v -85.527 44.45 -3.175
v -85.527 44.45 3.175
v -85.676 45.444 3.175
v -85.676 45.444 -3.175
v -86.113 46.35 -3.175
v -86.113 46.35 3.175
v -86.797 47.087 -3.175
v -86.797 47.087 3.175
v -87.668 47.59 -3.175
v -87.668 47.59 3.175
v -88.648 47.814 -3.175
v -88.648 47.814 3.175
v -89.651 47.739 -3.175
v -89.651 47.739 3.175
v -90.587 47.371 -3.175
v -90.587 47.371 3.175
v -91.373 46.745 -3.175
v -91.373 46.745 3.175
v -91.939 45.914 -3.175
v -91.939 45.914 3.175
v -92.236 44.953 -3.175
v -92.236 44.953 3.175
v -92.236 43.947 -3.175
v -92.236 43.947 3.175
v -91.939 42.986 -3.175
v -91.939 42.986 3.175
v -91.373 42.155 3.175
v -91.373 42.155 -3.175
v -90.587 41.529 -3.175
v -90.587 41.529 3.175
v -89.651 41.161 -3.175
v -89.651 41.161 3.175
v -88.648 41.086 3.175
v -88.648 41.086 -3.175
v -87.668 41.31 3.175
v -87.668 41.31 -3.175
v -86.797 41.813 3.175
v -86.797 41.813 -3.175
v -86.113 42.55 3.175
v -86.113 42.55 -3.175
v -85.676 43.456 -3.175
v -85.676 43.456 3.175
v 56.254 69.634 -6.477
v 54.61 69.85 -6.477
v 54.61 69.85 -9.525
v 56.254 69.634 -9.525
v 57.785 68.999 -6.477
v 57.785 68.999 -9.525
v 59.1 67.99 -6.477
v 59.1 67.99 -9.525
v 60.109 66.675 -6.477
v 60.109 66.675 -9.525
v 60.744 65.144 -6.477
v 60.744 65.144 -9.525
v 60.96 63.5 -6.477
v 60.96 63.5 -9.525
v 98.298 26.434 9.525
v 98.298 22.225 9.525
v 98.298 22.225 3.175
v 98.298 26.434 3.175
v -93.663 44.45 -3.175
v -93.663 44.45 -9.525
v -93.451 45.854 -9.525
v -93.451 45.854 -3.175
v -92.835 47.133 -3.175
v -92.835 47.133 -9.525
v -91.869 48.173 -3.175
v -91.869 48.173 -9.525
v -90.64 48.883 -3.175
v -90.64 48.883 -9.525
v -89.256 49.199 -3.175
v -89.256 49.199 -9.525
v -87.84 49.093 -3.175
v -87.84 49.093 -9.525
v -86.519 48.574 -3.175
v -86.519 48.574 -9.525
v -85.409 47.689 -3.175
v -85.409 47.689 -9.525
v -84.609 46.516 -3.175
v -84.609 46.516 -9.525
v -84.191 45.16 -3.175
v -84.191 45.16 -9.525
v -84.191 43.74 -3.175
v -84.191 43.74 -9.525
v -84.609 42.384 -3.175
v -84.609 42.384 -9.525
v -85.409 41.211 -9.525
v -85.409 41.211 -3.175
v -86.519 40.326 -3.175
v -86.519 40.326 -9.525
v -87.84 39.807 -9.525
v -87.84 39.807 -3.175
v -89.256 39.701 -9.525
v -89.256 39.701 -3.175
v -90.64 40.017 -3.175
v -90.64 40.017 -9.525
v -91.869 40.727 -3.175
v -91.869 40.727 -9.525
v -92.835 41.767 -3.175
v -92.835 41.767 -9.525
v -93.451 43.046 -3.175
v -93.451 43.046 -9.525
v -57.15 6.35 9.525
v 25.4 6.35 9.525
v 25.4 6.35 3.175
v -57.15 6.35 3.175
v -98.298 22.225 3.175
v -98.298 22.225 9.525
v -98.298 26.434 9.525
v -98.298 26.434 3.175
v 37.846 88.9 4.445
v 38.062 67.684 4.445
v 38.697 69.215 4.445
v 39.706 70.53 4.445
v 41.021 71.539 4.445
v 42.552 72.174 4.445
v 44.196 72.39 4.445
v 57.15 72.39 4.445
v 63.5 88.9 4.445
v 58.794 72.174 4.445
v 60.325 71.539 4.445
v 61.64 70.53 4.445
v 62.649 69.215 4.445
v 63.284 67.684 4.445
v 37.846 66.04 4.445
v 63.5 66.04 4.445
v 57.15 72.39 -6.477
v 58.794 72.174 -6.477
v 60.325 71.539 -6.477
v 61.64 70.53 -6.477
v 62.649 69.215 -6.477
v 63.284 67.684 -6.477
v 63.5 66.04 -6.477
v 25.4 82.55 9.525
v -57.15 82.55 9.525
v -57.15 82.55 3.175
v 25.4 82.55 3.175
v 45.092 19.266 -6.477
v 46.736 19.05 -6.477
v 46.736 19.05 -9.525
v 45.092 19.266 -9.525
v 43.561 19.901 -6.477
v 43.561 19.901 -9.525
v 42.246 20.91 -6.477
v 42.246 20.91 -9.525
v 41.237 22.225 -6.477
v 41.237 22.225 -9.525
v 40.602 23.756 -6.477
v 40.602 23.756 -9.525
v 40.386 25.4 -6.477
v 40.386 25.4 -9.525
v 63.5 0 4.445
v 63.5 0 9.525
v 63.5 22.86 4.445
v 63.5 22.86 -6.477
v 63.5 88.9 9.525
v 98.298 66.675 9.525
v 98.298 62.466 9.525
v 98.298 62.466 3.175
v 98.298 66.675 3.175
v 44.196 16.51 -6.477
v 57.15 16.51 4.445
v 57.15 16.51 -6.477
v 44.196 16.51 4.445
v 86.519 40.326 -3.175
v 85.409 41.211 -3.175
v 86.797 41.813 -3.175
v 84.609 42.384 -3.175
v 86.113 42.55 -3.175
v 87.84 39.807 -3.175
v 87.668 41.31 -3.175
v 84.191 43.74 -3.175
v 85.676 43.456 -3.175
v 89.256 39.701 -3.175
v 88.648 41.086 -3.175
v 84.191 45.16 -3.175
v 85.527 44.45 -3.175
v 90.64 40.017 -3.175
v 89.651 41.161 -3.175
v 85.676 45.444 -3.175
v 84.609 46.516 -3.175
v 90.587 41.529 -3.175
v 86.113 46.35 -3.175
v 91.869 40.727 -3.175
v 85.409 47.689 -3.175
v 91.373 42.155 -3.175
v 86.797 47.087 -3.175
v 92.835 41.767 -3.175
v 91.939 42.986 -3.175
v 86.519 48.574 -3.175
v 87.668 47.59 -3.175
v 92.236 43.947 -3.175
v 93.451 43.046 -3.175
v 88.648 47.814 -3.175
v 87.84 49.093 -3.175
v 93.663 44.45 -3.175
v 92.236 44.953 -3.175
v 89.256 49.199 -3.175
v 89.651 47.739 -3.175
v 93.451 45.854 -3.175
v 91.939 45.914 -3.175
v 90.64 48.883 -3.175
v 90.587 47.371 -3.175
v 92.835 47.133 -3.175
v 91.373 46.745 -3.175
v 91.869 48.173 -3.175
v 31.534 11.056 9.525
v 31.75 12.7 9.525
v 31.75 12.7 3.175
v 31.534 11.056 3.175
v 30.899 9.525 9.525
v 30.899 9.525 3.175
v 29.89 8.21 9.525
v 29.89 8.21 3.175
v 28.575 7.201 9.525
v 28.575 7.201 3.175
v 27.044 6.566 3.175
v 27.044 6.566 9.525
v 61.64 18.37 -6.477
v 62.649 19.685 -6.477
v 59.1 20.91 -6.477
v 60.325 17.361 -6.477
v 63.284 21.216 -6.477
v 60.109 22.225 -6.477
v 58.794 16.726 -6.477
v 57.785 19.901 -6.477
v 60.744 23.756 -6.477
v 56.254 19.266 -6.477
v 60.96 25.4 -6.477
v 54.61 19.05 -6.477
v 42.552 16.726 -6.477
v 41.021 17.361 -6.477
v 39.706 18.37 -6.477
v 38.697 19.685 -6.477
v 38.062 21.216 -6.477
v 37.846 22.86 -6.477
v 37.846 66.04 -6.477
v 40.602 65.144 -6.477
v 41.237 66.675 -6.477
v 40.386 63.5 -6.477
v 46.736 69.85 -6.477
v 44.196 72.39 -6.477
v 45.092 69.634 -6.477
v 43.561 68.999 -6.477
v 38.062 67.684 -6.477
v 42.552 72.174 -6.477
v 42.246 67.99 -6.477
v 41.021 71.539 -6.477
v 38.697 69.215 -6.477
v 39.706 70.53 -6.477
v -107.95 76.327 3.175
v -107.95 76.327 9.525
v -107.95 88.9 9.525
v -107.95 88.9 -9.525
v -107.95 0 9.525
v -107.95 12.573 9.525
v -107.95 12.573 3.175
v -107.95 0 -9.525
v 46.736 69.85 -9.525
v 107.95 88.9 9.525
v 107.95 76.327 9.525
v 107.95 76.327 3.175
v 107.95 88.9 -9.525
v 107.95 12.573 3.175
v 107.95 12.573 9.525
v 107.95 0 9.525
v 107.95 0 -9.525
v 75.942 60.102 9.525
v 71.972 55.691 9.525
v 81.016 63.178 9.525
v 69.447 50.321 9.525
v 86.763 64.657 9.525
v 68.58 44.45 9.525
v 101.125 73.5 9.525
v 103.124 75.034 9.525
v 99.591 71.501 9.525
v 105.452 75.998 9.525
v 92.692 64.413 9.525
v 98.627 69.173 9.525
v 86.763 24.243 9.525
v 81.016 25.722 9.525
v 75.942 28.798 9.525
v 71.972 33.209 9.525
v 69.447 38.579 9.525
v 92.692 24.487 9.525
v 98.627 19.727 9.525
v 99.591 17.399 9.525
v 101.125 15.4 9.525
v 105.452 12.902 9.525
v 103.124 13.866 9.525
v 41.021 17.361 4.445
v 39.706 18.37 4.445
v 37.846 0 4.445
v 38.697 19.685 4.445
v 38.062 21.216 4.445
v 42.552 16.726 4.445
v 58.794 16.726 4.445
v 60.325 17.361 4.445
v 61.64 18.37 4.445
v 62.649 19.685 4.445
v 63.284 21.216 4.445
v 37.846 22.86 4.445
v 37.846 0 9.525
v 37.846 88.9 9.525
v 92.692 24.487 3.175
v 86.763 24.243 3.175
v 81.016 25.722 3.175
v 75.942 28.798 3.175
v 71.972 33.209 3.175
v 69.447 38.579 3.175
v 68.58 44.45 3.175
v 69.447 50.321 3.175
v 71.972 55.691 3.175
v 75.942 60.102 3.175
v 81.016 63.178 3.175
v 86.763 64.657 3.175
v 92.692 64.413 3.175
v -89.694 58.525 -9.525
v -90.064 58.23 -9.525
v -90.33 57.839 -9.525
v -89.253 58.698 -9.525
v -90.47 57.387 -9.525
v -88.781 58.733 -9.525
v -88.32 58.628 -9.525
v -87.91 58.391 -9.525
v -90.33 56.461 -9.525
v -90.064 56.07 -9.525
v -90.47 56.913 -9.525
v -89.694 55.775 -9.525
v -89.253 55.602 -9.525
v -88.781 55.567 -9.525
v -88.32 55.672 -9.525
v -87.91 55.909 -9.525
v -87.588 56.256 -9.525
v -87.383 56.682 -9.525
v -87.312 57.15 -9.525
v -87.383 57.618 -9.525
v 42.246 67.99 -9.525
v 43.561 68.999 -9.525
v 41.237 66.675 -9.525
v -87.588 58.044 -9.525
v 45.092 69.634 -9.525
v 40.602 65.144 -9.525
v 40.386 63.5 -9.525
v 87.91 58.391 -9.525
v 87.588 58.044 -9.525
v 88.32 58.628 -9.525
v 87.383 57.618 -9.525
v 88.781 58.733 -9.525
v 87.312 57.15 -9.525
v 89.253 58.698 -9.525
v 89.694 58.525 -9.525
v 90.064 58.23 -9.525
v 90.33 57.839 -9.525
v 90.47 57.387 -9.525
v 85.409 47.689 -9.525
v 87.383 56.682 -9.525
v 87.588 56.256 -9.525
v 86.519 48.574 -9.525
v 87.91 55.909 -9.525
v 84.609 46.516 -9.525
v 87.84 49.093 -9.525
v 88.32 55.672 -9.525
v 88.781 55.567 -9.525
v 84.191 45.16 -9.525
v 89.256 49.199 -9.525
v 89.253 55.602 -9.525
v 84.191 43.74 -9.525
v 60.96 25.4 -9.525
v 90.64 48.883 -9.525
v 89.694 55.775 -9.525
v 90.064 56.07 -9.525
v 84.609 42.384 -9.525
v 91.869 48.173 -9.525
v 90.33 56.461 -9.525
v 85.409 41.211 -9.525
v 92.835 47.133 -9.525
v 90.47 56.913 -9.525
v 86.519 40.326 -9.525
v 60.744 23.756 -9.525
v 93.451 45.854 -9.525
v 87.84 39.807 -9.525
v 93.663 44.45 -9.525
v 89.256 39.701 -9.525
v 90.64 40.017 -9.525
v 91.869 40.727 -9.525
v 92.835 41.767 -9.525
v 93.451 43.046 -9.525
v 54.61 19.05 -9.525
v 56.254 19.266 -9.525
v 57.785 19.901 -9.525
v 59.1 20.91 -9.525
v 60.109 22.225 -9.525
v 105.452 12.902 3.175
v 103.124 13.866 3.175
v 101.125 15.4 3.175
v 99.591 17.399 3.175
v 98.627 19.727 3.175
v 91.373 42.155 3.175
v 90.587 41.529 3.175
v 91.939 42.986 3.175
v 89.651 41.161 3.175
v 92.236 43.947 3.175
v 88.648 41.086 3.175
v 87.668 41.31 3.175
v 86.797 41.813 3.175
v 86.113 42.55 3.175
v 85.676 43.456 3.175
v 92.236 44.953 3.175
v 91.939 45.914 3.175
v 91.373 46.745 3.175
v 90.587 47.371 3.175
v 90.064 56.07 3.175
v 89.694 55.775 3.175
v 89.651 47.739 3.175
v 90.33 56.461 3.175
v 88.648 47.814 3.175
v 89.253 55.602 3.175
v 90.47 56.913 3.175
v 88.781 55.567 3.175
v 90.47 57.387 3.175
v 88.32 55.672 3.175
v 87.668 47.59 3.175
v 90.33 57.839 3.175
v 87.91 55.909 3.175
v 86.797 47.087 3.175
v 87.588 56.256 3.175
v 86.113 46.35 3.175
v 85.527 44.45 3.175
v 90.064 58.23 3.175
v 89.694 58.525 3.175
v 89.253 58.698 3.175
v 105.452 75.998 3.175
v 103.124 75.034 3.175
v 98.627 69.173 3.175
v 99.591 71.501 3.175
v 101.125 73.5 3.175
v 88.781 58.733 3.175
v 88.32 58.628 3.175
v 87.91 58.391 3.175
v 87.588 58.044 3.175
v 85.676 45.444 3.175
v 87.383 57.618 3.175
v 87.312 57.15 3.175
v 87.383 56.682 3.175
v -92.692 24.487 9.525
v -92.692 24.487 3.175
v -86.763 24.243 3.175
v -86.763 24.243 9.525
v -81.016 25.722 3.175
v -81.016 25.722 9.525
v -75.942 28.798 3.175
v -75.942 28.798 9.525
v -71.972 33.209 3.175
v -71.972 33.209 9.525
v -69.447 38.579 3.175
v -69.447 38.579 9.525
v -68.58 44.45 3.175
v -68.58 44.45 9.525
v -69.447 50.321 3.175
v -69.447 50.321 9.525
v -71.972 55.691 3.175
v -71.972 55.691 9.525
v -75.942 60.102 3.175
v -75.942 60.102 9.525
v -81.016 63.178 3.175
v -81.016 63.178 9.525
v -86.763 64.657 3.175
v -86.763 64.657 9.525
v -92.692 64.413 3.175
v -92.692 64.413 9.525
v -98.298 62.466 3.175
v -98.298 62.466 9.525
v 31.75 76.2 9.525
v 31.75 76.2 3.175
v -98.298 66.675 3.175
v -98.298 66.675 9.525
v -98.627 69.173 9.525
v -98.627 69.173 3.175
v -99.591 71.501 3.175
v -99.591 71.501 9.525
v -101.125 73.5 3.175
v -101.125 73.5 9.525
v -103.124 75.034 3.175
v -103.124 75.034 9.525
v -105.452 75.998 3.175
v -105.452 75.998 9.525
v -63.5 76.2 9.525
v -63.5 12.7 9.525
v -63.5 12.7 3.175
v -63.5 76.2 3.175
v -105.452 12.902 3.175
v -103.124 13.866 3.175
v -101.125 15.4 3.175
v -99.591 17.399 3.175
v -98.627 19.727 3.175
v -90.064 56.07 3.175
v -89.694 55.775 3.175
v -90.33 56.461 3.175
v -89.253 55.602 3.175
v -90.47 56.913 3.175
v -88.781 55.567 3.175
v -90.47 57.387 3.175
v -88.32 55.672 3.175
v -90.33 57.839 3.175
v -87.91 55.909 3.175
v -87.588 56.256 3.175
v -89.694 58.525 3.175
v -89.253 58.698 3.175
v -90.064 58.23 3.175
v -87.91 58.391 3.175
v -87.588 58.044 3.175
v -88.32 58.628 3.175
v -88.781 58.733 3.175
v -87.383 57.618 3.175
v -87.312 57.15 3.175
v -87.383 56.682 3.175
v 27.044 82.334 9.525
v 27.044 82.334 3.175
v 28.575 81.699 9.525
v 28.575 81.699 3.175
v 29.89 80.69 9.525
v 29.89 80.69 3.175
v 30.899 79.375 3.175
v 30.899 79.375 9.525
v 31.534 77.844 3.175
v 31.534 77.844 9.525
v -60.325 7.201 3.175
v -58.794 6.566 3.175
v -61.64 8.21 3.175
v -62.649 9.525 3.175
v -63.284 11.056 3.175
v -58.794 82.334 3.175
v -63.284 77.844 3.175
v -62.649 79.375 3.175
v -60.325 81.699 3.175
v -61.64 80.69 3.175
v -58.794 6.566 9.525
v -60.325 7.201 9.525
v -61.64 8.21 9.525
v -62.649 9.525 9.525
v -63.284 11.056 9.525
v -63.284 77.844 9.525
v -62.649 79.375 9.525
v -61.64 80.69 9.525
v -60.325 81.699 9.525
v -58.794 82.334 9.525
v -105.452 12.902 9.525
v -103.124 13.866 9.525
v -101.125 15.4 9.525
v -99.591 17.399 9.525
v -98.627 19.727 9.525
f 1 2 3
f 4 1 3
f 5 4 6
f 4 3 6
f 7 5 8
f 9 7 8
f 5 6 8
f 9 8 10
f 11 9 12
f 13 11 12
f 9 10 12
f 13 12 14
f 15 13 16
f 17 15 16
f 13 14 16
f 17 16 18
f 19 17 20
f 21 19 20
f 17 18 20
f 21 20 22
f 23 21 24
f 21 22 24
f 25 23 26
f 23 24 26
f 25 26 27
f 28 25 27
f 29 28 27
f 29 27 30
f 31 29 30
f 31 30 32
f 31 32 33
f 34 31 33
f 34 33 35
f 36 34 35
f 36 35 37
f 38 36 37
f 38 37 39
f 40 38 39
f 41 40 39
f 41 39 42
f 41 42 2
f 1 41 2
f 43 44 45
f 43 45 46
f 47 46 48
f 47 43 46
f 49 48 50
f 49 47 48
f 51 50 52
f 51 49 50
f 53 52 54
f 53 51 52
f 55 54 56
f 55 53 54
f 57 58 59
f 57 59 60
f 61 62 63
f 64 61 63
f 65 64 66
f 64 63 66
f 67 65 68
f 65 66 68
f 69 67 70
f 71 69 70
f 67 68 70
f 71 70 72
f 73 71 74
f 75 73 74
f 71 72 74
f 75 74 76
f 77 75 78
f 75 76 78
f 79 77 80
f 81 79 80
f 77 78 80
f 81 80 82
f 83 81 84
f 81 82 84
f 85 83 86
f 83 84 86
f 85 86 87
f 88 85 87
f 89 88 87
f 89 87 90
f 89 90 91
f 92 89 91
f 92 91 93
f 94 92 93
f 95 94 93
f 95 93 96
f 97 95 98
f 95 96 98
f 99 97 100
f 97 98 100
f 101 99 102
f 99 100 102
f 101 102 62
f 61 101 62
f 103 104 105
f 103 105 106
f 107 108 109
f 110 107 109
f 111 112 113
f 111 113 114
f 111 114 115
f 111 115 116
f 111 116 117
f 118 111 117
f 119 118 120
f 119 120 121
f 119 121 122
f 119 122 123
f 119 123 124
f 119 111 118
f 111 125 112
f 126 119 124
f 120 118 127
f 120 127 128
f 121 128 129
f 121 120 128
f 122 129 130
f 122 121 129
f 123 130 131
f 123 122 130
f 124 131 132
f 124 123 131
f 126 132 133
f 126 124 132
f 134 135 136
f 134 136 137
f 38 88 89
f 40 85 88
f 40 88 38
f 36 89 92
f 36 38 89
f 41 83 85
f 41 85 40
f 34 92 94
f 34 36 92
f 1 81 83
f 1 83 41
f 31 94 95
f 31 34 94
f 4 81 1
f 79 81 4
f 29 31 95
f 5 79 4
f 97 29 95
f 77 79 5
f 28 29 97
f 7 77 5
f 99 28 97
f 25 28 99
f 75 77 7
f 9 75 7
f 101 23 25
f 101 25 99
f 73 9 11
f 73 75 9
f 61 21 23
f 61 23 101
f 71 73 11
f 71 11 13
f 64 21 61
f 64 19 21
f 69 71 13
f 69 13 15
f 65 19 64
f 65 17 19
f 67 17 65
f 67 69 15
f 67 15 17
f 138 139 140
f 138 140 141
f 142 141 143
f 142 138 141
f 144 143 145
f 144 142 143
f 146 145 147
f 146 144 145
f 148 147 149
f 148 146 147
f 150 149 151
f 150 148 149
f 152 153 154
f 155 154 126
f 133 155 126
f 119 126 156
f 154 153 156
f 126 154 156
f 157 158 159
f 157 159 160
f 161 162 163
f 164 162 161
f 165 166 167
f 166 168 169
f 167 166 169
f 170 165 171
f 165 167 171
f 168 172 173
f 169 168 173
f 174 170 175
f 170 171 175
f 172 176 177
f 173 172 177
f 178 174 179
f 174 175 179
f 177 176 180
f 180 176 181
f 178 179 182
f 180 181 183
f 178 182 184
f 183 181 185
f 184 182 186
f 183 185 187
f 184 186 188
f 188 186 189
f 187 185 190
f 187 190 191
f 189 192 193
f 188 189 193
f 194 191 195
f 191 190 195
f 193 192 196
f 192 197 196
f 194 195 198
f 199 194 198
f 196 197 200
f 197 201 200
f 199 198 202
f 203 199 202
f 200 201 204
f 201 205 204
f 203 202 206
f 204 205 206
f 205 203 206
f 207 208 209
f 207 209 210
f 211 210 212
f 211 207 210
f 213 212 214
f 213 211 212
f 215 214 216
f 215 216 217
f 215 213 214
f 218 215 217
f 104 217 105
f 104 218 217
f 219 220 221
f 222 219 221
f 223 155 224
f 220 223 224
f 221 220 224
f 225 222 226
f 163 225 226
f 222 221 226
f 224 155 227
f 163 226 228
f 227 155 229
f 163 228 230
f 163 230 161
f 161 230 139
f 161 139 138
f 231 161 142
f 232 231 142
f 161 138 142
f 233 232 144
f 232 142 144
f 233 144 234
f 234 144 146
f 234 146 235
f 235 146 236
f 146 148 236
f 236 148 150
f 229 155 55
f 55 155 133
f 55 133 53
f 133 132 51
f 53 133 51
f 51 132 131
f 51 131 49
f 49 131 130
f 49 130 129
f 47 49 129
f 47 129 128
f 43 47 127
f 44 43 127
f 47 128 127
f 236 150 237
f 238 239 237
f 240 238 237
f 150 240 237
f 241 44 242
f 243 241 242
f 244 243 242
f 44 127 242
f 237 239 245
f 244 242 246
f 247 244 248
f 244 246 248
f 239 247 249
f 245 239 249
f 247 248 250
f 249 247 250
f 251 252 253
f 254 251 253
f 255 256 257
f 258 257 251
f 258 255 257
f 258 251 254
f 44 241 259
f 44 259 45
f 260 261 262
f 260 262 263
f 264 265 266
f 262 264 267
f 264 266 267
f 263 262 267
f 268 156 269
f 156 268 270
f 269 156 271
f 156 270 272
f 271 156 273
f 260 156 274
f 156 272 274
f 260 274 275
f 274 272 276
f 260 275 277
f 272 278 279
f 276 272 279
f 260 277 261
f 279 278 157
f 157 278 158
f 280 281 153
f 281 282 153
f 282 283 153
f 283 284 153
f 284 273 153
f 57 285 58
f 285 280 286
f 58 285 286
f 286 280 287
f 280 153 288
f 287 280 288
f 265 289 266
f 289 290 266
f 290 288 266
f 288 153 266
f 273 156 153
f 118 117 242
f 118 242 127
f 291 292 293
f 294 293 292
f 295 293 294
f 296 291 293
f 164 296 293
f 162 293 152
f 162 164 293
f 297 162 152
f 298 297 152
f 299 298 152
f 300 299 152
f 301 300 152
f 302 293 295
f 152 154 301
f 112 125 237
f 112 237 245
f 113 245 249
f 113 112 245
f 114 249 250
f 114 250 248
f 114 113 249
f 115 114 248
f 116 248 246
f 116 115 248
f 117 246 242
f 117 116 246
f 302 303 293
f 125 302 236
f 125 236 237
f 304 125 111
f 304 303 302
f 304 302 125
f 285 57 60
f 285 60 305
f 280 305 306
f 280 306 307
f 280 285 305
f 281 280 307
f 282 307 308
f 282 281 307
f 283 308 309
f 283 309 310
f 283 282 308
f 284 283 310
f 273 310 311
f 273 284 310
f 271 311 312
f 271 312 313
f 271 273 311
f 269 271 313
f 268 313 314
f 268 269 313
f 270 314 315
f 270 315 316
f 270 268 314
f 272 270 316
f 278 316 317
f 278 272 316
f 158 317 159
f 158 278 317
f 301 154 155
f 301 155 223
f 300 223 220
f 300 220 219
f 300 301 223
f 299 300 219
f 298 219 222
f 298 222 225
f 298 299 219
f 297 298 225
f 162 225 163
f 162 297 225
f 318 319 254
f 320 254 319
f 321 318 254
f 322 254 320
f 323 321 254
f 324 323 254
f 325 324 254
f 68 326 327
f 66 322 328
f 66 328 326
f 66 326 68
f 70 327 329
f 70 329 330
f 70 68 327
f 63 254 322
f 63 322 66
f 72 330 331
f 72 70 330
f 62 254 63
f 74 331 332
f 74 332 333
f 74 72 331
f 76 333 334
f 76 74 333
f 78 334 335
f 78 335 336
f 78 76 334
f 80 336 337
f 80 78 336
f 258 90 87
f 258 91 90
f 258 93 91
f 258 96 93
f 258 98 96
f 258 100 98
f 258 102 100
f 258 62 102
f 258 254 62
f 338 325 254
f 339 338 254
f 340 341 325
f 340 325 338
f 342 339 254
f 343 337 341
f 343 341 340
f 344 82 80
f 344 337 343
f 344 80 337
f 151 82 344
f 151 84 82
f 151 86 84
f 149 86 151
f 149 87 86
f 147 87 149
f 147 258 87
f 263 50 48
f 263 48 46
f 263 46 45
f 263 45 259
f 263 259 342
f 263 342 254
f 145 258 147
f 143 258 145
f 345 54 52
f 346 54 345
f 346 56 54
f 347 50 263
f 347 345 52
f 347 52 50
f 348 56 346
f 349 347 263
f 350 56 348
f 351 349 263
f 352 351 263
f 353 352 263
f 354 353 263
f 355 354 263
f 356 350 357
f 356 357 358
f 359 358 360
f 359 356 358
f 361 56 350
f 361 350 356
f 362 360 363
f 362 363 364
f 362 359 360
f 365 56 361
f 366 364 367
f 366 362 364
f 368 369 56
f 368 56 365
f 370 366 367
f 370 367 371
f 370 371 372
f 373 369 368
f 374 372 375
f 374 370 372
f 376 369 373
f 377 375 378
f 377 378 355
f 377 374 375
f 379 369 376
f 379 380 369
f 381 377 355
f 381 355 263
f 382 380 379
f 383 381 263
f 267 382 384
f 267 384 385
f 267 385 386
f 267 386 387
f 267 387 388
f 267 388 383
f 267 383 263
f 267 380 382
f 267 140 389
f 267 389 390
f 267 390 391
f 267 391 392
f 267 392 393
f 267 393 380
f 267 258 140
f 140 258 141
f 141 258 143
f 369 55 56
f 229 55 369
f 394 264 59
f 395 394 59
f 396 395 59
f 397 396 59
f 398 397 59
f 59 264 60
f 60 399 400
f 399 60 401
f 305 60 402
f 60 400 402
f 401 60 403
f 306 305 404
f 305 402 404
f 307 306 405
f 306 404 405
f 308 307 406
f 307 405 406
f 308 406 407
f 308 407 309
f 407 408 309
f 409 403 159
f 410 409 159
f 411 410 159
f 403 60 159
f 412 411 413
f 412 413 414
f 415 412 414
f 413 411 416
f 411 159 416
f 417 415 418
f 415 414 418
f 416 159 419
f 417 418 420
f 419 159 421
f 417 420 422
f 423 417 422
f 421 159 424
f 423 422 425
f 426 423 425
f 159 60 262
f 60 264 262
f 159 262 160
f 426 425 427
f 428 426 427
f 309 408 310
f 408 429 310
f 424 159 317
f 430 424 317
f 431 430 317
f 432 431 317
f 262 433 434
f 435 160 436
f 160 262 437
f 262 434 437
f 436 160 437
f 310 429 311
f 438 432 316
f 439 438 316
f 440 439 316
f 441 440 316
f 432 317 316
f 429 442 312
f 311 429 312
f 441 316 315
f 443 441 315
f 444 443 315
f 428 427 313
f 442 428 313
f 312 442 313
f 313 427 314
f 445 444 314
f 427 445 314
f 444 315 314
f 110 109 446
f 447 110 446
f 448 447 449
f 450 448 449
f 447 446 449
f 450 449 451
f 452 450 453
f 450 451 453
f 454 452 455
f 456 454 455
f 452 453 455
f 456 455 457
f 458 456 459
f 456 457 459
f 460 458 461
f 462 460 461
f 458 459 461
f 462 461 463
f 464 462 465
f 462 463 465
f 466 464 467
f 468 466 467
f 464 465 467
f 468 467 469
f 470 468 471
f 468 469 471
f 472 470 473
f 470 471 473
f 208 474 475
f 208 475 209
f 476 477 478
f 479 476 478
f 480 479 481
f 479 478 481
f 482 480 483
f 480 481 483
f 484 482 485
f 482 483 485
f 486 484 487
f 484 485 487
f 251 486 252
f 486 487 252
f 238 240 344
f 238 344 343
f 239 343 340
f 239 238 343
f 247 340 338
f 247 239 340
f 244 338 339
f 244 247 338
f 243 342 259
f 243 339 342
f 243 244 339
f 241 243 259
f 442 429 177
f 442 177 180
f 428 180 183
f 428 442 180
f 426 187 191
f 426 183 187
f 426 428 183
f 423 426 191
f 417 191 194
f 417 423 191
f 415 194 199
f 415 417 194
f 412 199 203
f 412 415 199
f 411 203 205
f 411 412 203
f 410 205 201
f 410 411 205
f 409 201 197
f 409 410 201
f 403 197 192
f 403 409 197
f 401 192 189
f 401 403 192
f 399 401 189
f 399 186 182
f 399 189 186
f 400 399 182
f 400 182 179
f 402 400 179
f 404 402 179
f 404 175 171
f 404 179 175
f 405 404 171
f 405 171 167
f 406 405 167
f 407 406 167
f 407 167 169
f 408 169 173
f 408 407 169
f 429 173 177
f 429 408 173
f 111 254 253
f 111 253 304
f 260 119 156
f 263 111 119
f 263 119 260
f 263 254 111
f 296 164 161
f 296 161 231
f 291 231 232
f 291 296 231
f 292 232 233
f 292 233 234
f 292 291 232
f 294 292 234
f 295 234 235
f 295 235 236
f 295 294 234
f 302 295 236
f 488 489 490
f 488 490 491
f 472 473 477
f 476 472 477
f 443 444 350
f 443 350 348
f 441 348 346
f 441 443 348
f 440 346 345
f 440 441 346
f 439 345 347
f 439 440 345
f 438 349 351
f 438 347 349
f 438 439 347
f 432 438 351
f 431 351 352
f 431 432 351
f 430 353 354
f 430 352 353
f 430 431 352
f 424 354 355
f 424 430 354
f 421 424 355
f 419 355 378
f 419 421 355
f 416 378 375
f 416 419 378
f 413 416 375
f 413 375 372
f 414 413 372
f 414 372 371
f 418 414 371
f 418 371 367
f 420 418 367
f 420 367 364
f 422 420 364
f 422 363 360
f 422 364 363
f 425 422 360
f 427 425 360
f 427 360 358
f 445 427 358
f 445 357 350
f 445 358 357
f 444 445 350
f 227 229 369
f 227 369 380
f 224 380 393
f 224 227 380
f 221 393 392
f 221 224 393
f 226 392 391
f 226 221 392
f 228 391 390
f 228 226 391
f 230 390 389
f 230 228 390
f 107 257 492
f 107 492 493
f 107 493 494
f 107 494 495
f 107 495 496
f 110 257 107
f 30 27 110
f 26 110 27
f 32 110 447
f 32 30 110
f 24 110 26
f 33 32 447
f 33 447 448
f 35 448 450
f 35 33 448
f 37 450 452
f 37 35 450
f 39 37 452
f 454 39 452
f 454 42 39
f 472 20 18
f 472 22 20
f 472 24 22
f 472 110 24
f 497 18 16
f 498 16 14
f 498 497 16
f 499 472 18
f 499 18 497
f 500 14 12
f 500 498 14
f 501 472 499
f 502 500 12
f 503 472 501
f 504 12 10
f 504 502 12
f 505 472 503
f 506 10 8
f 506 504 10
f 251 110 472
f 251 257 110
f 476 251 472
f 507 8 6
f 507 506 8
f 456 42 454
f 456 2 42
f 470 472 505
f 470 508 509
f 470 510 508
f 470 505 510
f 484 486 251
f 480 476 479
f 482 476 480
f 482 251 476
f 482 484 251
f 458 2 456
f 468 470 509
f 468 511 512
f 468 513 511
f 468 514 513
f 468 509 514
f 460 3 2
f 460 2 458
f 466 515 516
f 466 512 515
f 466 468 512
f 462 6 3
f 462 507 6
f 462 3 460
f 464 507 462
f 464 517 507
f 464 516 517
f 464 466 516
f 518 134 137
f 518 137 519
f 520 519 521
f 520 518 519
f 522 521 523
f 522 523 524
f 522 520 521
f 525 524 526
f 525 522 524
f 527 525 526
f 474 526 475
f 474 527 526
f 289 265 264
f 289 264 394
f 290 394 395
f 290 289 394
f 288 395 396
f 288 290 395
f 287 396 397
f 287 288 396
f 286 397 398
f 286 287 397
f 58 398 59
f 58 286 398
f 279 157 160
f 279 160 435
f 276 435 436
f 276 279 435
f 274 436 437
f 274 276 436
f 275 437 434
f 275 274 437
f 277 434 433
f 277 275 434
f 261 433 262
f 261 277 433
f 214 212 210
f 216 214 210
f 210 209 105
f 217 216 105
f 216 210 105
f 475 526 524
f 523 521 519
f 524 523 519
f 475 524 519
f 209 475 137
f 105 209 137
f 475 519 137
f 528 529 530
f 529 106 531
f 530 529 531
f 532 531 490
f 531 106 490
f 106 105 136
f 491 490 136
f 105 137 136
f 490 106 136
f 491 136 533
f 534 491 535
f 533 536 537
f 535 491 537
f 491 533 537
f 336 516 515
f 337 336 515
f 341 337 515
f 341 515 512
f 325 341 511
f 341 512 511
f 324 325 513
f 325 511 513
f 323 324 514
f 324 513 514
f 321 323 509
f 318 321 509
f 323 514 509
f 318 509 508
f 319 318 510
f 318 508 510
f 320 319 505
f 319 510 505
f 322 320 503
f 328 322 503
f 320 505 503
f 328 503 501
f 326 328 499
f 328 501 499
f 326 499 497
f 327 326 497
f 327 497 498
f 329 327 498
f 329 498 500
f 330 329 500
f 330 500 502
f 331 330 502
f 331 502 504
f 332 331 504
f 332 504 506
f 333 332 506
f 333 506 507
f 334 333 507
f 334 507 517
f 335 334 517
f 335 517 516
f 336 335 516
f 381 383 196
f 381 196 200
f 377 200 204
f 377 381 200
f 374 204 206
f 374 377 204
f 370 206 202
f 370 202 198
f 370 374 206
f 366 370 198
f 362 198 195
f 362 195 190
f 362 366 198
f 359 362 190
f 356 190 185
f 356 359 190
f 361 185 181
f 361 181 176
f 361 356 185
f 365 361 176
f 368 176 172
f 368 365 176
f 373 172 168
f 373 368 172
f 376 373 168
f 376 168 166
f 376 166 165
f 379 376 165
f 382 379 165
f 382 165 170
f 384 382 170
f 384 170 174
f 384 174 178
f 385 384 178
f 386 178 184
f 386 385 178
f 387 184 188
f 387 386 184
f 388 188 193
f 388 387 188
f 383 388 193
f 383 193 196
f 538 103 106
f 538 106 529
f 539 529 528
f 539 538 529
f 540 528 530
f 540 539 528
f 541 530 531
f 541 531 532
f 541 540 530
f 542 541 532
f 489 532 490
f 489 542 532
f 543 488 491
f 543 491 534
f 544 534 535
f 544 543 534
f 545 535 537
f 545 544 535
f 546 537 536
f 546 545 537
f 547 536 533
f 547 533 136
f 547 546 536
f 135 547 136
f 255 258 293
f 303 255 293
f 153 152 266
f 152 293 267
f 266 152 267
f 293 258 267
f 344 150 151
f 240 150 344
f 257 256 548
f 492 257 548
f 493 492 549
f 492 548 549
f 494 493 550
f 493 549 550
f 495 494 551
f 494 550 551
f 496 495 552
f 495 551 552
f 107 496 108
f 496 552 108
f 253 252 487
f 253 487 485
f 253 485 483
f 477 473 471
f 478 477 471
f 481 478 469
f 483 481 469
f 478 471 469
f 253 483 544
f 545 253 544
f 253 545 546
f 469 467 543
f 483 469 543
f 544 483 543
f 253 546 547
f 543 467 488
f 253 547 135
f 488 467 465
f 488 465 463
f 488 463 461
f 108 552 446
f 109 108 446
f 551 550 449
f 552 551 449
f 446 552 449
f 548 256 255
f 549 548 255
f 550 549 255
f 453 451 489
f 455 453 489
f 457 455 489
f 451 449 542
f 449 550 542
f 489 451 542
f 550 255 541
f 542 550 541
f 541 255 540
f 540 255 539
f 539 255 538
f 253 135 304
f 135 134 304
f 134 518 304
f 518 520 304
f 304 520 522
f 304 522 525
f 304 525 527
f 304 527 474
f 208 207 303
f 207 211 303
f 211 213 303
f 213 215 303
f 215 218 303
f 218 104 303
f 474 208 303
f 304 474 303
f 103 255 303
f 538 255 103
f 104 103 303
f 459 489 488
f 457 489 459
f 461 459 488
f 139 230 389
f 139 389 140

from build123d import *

# Parameters (mm, degrees)
SKETCH1_W           = 215.9
SKETCH1_H           = 19.05
BOSS_EXTRUDE1_DEPTH = 88.9
SKETCH2_W           = 25.654
SKETCH2_H           = 88.9
CUT_EXTRUDE1_DEPTH  = 5.08
CUT_EXTRUDE2_DEPTH  = 6.35
CUT_EXTRUDE3_DEPTH  = 141.54029102
CUT_EXTRUDE4_DEPTH  = 10.922
CUT_EXTRUDE5_DEPTH  = 6.35
SKETCH9_R           = 3.3734375
SKETCH9_R_2         = 1.5875
CUT_EXTRUDE6_DEPTH  = 142.135803395
SKETCH10_R          = 4.7625
CUT_EXTRUDE7_DEPTH  = 6.35


with BuildPart() as part:
    # Sketch1 → Boss-Extrude1 (new body)
    with BuildSketch(Plane(origin=(0, 0, 0), x_dir=(1, 0, 0), z_dir=(0, 1, 0))):
        Rectangle(SKETCH1_W, SKETCH1_H)
    extrude(amount=BOSS_EXTRUDE1_DEPTH)

    # Sketch2 → Cut-Extrude1 (cut)
    with BuildSketch(Plane.XY.offset(9.525)):
        with Locations((50.673, 44.45)):
            Rectangle(SKETCH2_W, SKETCH2_H)
    extrude(amount=-CUT_EXTRUDE1_DEPTH, mode=Mode.SUBTRACT)

    # Sketch3 → Cut-Extrude2 (cut)
    with BuildSketch(Plane.XY.offset(9.525)):
        with BuildLine():
            Line((-57.15, 82.55), (25.4, 82.55))
            ThreePointArc((25.4, 82.55), (29.890128061, 80.690128061), (31.75, 76.2))
            Line((31.75, 76.2), (31.75, 12.7))
            ThreePointArc((31.75, 12.7), (29.890128061, 8.209871939), (25.4, 6.35))
            Line((25.4, 6.35), (-57.15, 6.35))
            ThreePointArc((-57.15, 6.35), (-61.640128061, 8.209871939), (-63.5, 12.7))
            Line((-63.5, 12.7), (-63.5, 76.2))
            ThreePointArc((-63.5, 76.2), (-61.640128061, 80.690128061), (-57.15, 82.55))
        make_face()
    extrude(amount=-CUT_EXTRUDE2_DEPTH, mode=Mode.SUBTRACT)

    # Sketch6 → Cut-Extrude3 (cut, through all)
    with BuildSketch(Plane.XY.offset(4.445)):
        with BuildLine():
            Line((46.736, 69.85), (54.61, 69.85))
            ThreePointArc((54.61, 69.85), (59.100128061, 67.990128061), (60.96, 63.5))
            Line((60.96, 63.5), (60.96, 25.4))
            ThreePointArc((60.96, 25.4), (59.100128061, 20.909871939), (54.61, 19.05))
            Line((54.61, 19.05), (46.736, 19.05))
            ThreePointArc((46.736, 19.05), (42.245871939, 20.909871939), (40.386, 25.4))
            Line((40.386, 25.4), (40.386, 63.5))
            ThreePointArc((40.386, 63.5), (42.245871939, 67.990128061), (46.736, 69.85))
        make_face()
    extrude(amount=-CUT_EXTRUDE3_DEPTH, mode=Mode.SUBTRACT)

    # Sketch5 → Cut-Extrude4 (cut)
    with BuildSketch(Plane.XY.offset(4.445)):
        with BuildLine():
            Line((44.196, 72.39), (57.15, 72.39))
            ThreePointArc((57.15, 72.39), (61.640128061, 70.530128061), (63.5, 66.04))
            Line((63.5, 66.04), (63.5, 22.86))
            ThreePointArc((63.5, 22.86), (61.640128061, 18.369871939), (57.15, 16.51))
            Line((57.15, 16.51), (44.196, 16.51))
            ThreePointArc((44.196, 16.51), (39.705871939, 18.369871939), (37.846, 22.86))
            Line((37.846, 22.86), (37.846, 66.04))
            ThreePointArc((37.846, 66.04), (39.705871939, 70.530128061), (44.196, 72.39))
        make_face()
    extrude(amount=-CUT_EXTRUDE4_DEPTH, mode=Mode.SUBTRACT)

    # Sketch8 → Cut-Extrude5 (cut)
    with BuildSketch(Plane.XY.offset(9.525)):
        with BuildLine():
            ThreePointArc((-98.298, 26.433896204), (-68.58, 44.45), (-98.298, 62.466103796))
            Line((-98.298, 62.466103796), (-98.298, 26.433896204))
        make_face()
        with BuildLine():
            Line((-98.298, 62.466103796), (-98.298, 66.675))
            ThreePointArc((-98.298, 66.675), (-101.125005348, 73.499994652), (-107.95, 76.327))
            Line((-107.95, 76.327), (-107.95, 12.573))
            ThreePointArc((-107.95, 12.573), (-101.125005348, 15.400005348), (-98.298, 22.225))
            Line((-98.298, 22.225), (-98.298, 26.433896204))
            Line((-98.298, 26.433896204), (-98.298, 62.466103796))
        make_face()
    cut_extrude5 = extrude(amount=-CUT_EXTRUDE5_DEPTH, mode=Mode.SUBTRACT)

    # Sketch9 → Cut-Extrude6 (cut, through all)
    with BuildSketch(Plane.XY.offset(9.525)):
        with Locations((-88.9, 44.45)):
            Circle(SKETCH9_R)
        with Locations((-88.9, 57.15)):
            Circle(SKETCH9_R_2)
    cut_extrude6 = extrude(amount=-CUT_EXTRUDE6_DEPTH, mode=Mode.SUBTRACT)

    # Sketch10 → Cut-Extrude7 (cut)
    with BuildSketch(Plane(origin=(0, 0, -9.525), x_dir=(-1, 0, 0), z_dir=(0, 0, -1))):
        with Locations((88.9, 44.45)):
            Circle(SKETCH10_R)
    cut_extrude7 = extrude(amount=-CUT_EXTRUDE7_DEPTH, mode=Mode.SUBTRACT)

    # Mirror1: Cut-Extrude5, Cut-Extrude6, Cut-Extrude7 across plane
    add(cut_extrude5.mirror(Plane(origin=(0, 0, 0), x_dir=(0, 0, 1), z_dir=(1, 0, 0))), mode=Mode.SUBTRACT)
    add(cut_extrude6.mirror(Plane(origin=(0, 0, 0), x_dir=(0, 0, 1), z_dir=(1, 0, 0))), mode=Mode.SUBTRACT)
    add(cut_extrude7.mirror(Plane(origin=(0, 0, 0), x_dir=(0, 0, 1), z_dir=(1, 0, 0))), mode=Mode.SUBTRACT)


solid = part.part
